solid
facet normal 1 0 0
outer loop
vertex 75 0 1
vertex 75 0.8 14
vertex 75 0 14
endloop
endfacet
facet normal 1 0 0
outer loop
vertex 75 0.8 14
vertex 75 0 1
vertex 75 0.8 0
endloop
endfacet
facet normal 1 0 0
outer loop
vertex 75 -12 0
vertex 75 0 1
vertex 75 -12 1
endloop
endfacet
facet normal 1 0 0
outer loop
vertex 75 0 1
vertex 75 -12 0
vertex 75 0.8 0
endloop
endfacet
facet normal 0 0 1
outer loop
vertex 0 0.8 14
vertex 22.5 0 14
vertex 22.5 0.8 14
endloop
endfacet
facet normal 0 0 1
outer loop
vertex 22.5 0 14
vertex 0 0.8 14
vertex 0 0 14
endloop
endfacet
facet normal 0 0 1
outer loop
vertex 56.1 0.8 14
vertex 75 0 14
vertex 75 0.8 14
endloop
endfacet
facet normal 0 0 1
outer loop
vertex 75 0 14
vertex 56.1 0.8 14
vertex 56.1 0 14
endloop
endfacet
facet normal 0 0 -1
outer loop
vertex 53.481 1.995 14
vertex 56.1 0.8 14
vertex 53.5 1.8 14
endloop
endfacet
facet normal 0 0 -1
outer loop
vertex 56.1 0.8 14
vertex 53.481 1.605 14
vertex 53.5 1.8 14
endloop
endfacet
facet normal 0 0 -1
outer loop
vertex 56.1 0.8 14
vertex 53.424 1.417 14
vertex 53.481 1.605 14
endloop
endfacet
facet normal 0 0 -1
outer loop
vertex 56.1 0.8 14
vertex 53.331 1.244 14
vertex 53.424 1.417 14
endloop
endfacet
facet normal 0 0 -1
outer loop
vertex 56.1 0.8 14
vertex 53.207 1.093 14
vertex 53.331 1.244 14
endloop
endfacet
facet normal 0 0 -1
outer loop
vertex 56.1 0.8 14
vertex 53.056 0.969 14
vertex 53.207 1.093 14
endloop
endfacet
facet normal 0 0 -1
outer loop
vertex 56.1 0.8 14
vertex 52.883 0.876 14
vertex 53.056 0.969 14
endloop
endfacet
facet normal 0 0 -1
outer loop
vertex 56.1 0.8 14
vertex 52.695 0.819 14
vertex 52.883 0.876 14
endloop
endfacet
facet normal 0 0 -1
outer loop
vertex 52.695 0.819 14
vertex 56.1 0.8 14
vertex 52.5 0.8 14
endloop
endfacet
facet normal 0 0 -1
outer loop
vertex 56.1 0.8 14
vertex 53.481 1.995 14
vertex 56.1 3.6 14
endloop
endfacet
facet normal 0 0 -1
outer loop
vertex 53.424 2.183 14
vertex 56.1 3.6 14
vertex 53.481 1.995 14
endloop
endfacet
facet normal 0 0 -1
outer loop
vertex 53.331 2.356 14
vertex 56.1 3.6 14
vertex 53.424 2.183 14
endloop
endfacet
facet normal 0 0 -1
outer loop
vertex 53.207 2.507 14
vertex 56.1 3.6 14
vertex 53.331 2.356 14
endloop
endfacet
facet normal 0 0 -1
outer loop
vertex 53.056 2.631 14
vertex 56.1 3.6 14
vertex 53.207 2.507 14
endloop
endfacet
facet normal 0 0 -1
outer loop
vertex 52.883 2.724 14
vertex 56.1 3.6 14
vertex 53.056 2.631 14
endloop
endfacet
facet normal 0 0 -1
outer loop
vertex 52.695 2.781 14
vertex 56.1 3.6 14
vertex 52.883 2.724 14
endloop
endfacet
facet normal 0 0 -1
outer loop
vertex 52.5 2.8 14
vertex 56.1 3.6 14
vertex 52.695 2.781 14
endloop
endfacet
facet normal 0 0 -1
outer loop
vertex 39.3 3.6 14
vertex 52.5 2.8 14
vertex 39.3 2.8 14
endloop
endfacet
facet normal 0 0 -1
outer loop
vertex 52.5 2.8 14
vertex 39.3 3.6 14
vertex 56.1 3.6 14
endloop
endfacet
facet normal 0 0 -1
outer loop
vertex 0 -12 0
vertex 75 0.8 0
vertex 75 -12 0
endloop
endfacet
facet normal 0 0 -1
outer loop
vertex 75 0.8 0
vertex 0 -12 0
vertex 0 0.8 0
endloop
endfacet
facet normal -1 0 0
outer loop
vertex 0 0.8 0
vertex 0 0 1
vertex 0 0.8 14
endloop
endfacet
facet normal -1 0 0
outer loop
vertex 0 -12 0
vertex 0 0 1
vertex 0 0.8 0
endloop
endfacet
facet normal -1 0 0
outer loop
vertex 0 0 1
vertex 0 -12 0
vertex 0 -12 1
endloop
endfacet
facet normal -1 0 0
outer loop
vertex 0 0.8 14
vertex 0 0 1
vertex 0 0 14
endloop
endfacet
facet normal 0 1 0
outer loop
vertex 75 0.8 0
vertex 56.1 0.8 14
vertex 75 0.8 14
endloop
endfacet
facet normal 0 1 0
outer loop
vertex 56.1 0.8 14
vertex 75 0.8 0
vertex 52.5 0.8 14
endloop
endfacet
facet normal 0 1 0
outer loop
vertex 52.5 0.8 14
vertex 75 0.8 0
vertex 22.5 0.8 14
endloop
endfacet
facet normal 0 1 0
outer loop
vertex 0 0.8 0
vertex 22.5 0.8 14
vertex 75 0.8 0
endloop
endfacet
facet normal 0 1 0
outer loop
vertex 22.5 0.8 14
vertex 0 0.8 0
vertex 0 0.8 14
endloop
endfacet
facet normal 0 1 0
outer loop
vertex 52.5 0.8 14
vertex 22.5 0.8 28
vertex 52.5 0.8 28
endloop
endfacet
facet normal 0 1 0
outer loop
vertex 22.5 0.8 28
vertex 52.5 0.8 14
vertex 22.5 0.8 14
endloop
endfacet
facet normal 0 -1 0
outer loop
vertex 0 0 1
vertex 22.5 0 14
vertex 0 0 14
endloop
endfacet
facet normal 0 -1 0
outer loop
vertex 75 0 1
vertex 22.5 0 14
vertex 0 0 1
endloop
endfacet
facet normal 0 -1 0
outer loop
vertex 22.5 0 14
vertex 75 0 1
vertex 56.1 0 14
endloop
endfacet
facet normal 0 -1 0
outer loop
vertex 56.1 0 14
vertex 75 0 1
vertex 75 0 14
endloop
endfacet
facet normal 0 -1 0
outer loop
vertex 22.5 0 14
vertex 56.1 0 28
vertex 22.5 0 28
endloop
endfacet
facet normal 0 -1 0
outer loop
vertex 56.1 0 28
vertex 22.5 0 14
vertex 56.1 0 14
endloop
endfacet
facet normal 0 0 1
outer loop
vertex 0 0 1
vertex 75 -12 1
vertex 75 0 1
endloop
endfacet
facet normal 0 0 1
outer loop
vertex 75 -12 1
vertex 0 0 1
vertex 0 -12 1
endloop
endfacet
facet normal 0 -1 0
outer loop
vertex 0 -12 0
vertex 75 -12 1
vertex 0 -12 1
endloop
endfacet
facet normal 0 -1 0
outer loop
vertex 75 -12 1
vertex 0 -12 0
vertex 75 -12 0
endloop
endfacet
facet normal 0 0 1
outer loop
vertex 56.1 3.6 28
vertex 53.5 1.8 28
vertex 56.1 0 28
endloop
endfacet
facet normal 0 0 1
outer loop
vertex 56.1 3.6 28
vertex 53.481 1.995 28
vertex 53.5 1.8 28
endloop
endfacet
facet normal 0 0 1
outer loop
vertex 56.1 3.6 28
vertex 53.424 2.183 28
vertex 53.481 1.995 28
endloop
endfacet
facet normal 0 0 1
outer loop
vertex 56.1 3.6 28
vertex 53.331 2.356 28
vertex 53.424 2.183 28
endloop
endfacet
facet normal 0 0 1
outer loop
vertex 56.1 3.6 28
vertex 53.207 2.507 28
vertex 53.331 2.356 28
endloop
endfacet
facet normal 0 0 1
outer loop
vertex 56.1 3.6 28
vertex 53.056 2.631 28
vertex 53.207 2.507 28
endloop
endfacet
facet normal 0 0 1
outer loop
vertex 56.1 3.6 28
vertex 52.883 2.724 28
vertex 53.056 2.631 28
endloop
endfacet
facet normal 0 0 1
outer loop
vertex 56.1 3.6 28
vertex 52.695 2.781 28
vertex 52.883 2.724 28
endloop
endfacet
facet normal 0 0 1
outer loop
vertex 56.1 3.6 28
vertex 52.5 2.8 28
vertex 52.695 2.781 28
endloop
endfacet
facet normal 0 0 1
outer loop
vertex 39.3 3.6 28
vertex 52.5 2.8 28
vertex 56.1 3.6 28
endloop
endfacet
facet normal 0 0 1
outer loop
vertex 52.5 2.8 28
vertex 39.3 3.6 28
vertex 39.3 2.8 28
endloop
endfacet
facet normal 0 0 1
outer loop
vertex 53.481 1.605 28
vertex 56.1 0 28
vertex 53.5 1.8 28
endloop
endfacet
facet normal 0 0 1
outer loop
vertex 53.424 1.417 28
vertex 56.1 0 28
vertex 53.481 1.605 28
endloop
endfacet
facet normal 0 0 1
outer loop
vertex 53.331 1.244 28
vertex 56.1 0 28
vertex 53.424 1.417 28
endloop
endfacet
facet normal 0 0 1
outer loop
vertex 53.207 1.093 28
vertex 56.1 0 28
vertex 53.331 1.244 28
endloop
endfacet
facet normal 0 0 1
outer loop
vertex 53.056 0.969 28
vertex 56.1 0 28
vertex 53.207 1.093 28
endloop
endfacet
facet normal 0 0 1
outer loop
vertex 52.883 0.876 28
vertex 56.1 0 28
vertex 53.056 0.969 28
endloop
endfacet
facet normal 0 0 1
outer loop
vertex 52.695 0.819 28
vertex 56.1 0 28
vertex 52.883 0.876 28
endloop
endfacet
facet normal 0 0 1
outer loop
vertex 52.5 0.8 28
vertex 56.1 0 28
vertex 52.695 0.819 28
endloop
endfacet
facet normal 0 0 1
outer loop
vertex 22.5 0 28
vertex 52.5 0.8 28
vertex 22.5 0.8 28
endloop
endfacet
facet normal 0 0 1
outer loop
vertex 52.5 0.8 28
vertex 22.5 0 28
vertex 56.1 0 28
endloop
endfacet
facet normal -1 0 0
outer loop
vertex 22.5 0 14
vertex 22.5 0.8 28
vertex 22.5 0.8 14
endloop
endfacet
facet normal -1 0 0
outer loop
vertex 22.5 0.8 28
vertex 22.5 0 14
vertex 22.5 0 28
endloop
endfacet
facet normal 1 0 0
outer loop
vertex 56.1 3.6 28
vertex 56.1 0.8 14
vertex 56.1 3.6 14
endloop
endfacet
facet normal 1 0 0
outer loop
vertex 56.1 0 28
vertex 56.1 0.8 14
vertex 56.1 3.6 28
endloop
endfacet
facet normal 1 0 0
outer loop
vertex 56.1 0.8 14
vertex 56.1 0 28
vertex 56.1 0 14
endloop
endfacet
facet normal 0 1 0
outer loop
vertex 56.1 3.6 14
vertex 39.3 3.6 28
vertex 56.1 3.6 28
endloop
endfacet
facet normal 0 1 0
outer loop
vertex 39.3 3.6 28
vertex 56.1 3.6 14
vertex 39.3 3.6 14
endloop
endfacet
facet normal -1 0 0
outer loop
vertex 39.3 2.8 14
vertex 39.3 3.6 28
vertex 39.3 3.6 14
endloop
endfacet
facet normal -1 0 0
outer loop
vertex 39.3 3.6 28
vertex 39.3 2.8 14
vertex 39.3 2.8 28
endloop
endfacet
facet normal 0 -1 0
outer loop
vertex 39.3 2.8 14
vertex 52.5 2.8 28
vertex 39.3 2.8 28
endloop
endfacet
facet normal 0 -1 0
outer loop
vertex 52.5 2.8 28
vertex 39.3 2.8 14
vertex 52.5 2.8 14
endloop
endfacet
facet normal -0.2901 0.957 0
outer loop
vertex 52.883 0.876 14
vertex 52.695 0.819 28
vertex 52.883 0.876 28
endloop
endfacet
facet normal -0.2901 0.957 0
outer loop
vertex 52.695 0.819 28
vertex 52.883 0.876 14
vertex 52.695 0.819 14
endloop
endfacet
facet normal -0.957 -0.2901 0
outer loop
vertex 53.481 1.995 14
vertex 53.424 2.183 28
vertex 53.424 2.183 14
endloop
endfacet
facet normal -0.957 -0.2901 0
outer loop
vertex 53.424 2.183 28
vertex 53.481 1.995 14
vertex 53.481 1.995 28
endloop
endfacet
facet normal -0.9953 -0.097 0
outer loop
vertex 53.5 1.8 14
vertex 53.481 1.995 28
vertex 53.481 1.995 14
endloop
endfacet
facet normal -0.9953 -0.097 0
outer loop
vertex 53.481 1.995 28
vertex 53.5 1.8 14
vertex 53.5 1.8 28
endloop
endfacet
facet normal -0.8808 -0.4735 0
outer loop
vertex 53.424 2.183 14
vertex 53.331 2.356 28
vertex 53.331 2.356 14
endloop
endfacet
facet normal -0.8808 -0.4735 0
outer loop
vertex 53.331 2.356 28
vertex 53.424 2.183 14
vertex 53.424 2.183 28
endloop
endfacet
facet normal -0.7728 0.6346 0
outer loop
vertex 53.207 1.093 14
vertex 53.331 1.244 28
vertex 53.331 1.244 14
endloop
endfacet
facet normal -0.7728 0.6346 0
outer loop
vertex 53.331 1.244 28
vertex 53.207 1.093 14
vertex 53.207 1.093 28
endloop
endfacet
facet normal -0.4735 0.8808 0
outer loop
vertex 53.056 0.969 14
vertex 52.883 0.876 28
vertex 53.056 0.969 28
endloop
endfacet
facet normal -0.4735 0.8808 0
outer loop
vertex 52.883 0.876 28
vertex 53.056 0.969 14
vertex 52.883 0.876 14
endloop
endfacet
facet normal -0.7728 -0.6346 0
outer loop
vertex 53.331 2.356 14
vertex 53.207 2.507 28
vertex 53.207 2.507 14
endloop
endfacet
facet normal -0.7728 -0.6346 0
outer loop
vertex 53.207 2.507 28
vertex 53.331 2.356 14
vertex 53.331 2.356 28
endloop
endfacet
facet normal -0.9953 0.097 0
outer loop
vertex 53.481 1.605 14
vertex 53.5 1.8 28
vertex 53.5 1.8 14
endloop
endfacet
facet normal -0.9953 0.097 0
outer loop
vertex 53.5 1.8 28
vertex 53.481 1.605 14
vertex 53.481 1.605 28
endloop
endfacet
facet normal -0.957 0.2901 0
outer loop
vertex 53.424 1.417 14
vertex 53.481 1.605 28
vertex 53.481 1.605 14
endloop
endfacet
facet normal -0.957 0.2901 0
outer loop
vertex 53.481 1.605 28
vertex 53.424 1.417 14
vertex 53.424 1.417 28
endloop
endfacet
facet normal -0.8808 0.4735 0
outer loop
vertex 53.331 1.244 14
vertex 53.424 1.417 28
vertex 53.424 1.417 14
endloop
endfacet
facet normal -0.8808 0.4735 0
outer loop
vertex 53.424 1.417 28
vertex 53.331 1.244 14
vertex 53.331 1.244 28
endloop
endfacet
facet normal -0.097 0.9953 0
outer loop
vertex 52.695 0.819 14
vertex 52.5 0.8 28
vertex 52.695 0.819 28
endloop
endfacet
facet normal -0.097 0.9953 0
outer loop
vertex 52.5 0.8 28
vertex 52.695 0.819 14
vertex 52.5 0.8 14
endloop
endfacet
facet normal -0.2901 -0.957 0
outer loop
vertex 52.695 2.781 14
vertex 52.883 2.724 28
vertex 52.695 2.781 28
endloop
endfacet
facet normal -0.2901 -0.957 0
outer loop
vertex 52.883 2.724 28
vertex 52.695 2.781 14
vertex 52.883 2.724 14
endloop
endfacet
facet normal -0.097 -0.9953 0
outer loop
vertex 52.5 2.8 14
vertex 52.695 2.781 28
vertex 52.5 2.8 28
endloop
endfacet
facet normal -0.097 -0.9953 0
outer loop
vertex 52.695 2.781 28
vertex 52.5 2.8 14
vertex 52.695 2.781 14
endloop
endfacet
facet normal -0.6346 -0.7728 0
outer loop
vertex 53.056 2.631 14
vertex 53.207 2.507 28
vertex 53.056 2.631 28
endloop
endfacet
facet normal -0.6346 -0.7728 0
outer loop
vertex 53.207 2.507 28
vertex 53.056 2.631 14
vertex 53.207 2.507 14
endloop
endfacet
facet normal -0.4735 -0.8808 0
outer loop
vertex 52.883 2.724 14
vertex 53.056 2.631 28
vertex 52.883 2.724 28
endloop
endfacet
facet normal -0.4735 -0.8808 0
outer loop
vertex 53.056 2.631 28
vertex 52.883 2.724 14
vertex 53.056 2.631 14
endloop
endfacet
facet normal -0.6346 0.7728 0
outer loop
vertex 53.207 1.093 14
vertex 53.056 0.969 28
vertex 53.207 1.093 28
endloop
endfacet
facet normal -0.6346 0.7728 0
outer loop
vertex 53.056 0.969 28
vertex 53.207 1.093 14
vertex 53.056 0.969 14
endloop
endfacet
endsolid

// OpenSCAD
//////////////////////////////////////////////////////////////////////////////////////
///
///  FLEXBATTER: Flexing battery holder with built-in spring
///
///  This file generates battery holders for arbitrary cylindrical sizes.
///  The number of batteries and their size is fully parametrized.
///
///  The usual metallic spring at the minus pole is replaced by a
///  flexible printed spring, which is pressing the contacts firmly to 
///  the battery.
///
///  The contacts for the plus and minus pole can easily be made by
///  a few windings of the uninsulated ends of the connecting wires.
///  Each battery compartment contains are several holes to the outside
///  as well ad to the neighboring compartments, through which connecting
///  wires can be passed for easy configuring of parallel, serial or
///  balanced-serial battery packs.
///  
///  The preconfigured battery sizes are:
///  AA, AAA, C, D, 18650(Li-Ion), 18650P(protected Li-Ion), CR123A(16340)
///  
///  Given that the printed plastic spring needs to be flexible, ABS is the material
///  of choice here.
///
//////////////////////////////////////////////////////////////////////////////////////
///
///  2014-09-09 Heinz Spiess, Switzerland
///
///  released under Creative Commons - Attribution - Share Alike licence (CC BY-SA)
//////////////////////////////////////////////////////////////////////////////////////

// build a cube with chamfered edges
module chamfered_cube(size,d=1){
   hull(){
     translate([d,d,0])cube(size-2*[d,d,0]);
     translate([0,d,d])cube(size-2*[0,d,d]);
     translate([d,0,d])cube(size-2*[d,0,d]);
   }
}


// draw an arc width height h between radius r1..r2 and angles a1..a2
module arc(r1,r2,h,a1=0,a2=0){
     if(a2-a1<=180){
        difference(){
           cylinder(r=r2,h=h);
           translate([0,0,-1])cylinder(r=r1,h=h+2);
	   rotate(a2)translate([-r1-r2,0,-1])cube([2*(r1+r2),2*(r1+r2),h+2]);
	   rotate(a1+180)translate([-r1-r2,0,-1])cube([2*(r1+r2),2*(r1+r2),h+2]);
        }
     } else {
           difference(){
              cylinder(r=r2,h=h);
              translate([0,0,-1])cylinder(r=r1,h=h+2);
              intersection(){
	       rotate(a2)translate([-r1-r2,0,-1])cube([2*(r1+r2),2*(r1+r2),h+2]);
	       rotate(a1+180)translate([-r1-r2,0,-1])cube([2*(r1+r2),2*(r1+r2),h+2]);
	      }
           }
     }
}

/////////////////////////////////////////////////////////////////////////////////
// sline - generate a "snake line" of width w and height h 
// with a arbitrary sequence of segments defined by a radius and a turning angle
//
//   angle[i] > 0  left turn / counter-clockwise
//   angle[i] < 0  left turn / clockwise
//   angle[i] = 0  straight segment with length radius[i]
//
/////////////////////////////////////////////////////////////////////////////////
// Heinz Spiess, 2014-09-06 (CC BY-SA)
/////////////////////////////////////////////////////////////////////////////////
module sline(angle,radius,i,w,h){
   scale([angle[i]>=0?1:-1,1,1])
      assign(r=abs(radius[i]))assign(a=angle[i])
         translate([a?r:0,0,0]){
	    translate([-w/2,-r-0.01,0])cube([w,0.02,h]); // tiny overlap!
            if(a)arc(r-w/2,r+w/2,0,a,h=h);
	    else if(r>0)translate([-w/2,-r,0])cube([w,r,h]);
      if(i+1<len(angle))
           rotate(angle[i])
	      translate([a?-r:0,a?0:-r,0])
	         sline(angle,radius,i+1,w,h);
  }
}

//////////////////////////////////////////////////////////////////////////////////
//
//  FLEXBATTER:  Flexing battery holder with integrated plastic spring
//
//////////////////////////////////////////////////////////////////////////////////
module flexbatter(n=1,l=65,d=18,hf=0.75,r=4,shd=3,eps=0.28,el=0,xchan=[1/4,3/4],$fn=24){
ew=0.56;   // extrusion width
eh=0.25;   // extrusion height
w = 4*ew;  // case wall thickness
ws = 2*ew; // spring wall thickness
ch = w-ws; // edge chamfering
deepen=0; //deepening for side grip of batteries
//el = 0;  // extra length in spring
//eps = 0.28;
//shd = 3; // screw hole diameter
//hf=0.75;
//xchan=[1/4,3/4]; // relative position of traversal wire channels

r = d/5+2*ws; // linear spring length (depends on sline() call!)

   for(i=[0:n-1])translate([0,i*(d+w+ws),0]){ // generate n battery cases
      difference(){
         
         union(){
            difference(){
               // main body
               translate([0,-w-d/2,0])
	          chamfered_cube([l+w,d+2*w+(i<n-1?ws:0),hf*d+w+ch],ch);
	       // main cavity
               translate([-2,-d/2,w])cube([2+l,d,d+1]);
	       // cavity for locating plastic spring
               translate([-1,-d/2,-1])cube([2,d,d+w+2]);
	       // small cylindrical carving of walls and bottom
	       if(eps>0)translate([-1,0,d/2+w])rotate([0,90,0])cylinder(r=d/2+eps,h=l+1);
            }
      
            // plastic spring for minus pole
            for(sy=[-1,1])scale([1,sy,1])assign(D=d+2*w-2*ws-0.7){
               translate([ch,d/2+w-ws/2,0])rotate(-90)
		  //sline([90,0,120,90,120,90,0],[d/8+2,d/6,d/8-1,d/8,-d/8,d/8,d/2],0,ws,hf*d+w);
		  sline([0,180,0,180,0,-180,0,90,0],[r+ch+el,D/4,el,D/12,el/2,D/12,1+el/2,D/5,D/3],0,ws,hf*d+w);


            }
         }
      
         // lower and upper holes for contacts
         for(z=[-2*ws,2*ws])
            translate([-2*ws,-w,w-ws/2+d/2+z])cube([l+2*w+2,2*w,ws]);
      
         // longitudinal bottom wire channel
         translate([-2*ws,0,0])rotate([0,90,0])cylinder(r=w/2,h=l+w+2+r,$fn=5);
      
         // traversal bottom wire channels
         for(x=l*xchan)translate([x,-d/2-w-1,eh]) rotate([-90,0,0])cylinder(r=w/2,h=d+2*w+ws+2,$fn=6);
   
         // grip deepening
	 if(deepen>0)
            translate([w+l/2-0.5,-d/2-w-0.01,w+d+l])
	       rotate([-90,0,0]){
	          cylinder(r=l+deepen*d,h=d+2*w+2*ws+2,$fn=72);
	          if(i==0)cylinder(r1=l+deepen*d+ch,r2=l+deepen*d,h=ch+0.02,$fn=72);
	          if(i==n-1)translate([0,0,d+2*w-ch])cylinder(r2=l+deepen*d+ch,r1=l+deepen*d,h=ch+0.02,$fn=72);

               }
         // conical screw holes in corners
         for(x=[7+shd,l-2*shd])for(y=[-d/2+shd,d/2-shd])
             translate([x,y,-1]){
                cylinder(r=shd/2,h=w+2);
                translate([0,0,w-shd/2+1])cylinder(r1=shd/2,r2=shd,h=shd/2+0.01);
             }

         // holes for wires passing inside
         for(sy=[-1,1])scale([1,sy,1]){
	    translate([l-1,-d/2,w])cube([w+2,2,2]);
            for(x=[3,l-7])translate([x,-d/2-w-ws-1,w])cube([3,w+ws+3,2]); 
            translate([3,-d/2+w/2-0.75,-1])cube([3,1.5,w+2]); 
            translate([-0.5,-d/2+w/2,0])rotate([0,90,0])cylinder(r=w/2,h=6.5,$fn=5);
         }

         // engrave battery symbol
	 translate([w+l/2,d/4+1,w])cube([l/5,d/4.5,4*eh],true);
	 translate([w+l/2+l/10,d/4+1,w])cube([d/7,d/10,4*eh],true);
	 // engrave plus symbol
	 assign(sy=(l>12*shd)?1:-1){ // for short batteries +- on the side
	    translate([w+l/2+l/(sy>0?5:10),sy*(d/4+1),w]){
	       cube([1,d/4,4*eh],true);
	       cube([d/4,1,4*eh],true);
            }
	 // engrave minus symbol
	    translate([w+l/2-l/(sy>0?5:10),sy*(d/4+1),w])
	       cube([1,d/4,4*eh],true);
         }
   
         //correction for middle separators
         //if(i<n-1) translate([-d,d/2+w-ws/2,-1])cube([d,ws/2+0.1,d+2]);
	 //else translate([1,d/2+w,-0.01])cylinder(r1=ch,r2=0,h=ch);
         //if(i>0) translate([-d,-d/2-w-0.1,-1])cube([d,ws/2+0.1,d+2]);
	 //else translate([1,-d/2-w,-0.01])cylinder(r1=ch,r2=0,h=ch);


      }


      // horizontal contact bulges (+ and - pole)
      for(x=[-0.3,l])
         hull()for(y=[-3+el,3-el])
            translate([x,y,w+d/2])sphere(r=ws);
   
      // vertical contact bulge (+ pole only)
      if(0)hull()for(z=[-3+el,3-el])for(x=[0,w-ws])
            translate([l+x,0,w+d/2+z])sphere(r=ws);



   }

}

module flexbatter18650(n=1){
   flexbatter(n=n,l=65.5,d=18.4,hf=0.75,shd=3,eps=0.28);
}  

module flexbatter18650P(n=1){
   flexbatter(n=n,l=67.5,d=18.4,hf=0.75,shd=3,eps=0.28);
}  

module flexbatterCR123A(n=1){
   flexbatter(n=n,l=35.1,d=16.7,hf=0.75,shd=3,xchan=[0.5],eps=0.28);
}  

module flexbatterD(n=1){
   flexbatter(n=n,l=61.5,d=34.0,hf=0.75,shd=3,eps=0.28);
}  

module flexbatterC(n=1){
   flexbatter(n=n,l=51.6,d=26.4,hf=0.75,shd=3,eps=0.28);
}  

module flexbatterAA(n=1){
   flexbatter(n=n,l=51.6,d=14.4,hf=0.80,shd=2.5,el=0.5,eps=0.28);
}  

module flexbatterAAA(n=1){
   flexbatter(n=n,l=46.1,d=10.45,hf=0.84,shd=2,el=1,xchan=[0.5],eps=0);
}  

module flexbatter18650x1(){ // AUTO_MAKE_STL
  flexbatter18650(n=1);
}

module flexbatter18650Px1(){ // AUTO_MAKE_STL
  flexbatter18650P(n=1);
}

module flexbatterCR123Ax1(){ // AUTO_MAKE_STL
  flexbatterCR123A(n=1);
}

module flexbatterAAx1(){ // AUTO_MAKE_STL
  flexbatterAA(n=1);
}

module flexbatterAAAx1(){ // AUTO_MAKE_STL
  flexbatterAAA(n=1);
}

module flexbatterCx1(){ // AUTO_MAKE_STL
  flexbatterC(n=1);
}

module flexbatter18650x2(){ // AUTO_MAKE_STL
  flexbatter18650(n=2);
}

module flexbatterAAx2(){ // AUTO_MAKE_STL
  flexbatterAA(n=2);
}

module flexbatterAAAx2(){ // AUTO_MAKE_STL
  flexbatterAAA(n=2);
}

module flexbatterCx2(){ // AUTO_MAKE_STL
  flexbatterC(n=2);
}

module flexbatter18650x3(){ // AUTO_MAKE_STL
  flexbatter18650(n=3);
}

module flexbatterAAx3(){ // AUTO_MAKE_STL
  flexbatterAA(n=3);
}

module flexbatterAAAx3(){ // AUTO_MAKE_STL
  flexbatterAAA(n=3);
}

module flexbatter18650x4(){ // AUTO_MAKE_STL
  flexbatter18650(n=4);
}

module flexbatterAAx4(){ // AUTO_MAKE_STL
  flexbatterAA(n=4);
}

module flexbatterAAAx4(){ // AUTO_MAKE_STL
  flexbatterAAA(n=4);
}

module rackhook(){
  raillen=75;
  railh=14;
  railth=0.8;
  restde=12;
  pegw=11;
  pegth=1.9;//1.8
  flapw=30;
  flaph=14;
  flapth=railth;
  hookth=flapth;
  hookw=pegw*1.2;
  hookgap=pegth+0.1;
  spineth=flapth+hookgap+hookth;
  difference(){
  union(){
	//rail
  cube([raillen,railth,railh]);
  //rest
  translate([0,-restde,0]) cube([raillen,restde,1]);
  //outer plate
  translate([(raillen/2-flapw/2),0,railh]) cube([flapw,flapth,flaph]);
  //spine of hook 
  translate([(raillen/2+flapw/2),0,railh]) cube([spineth,spineth,flaph]);
  //hook
  translate([(raillen/2-flapw/2)+flapw-hookw,flapth+hookgap,railh]) cube([hookw,flapth,flaph]);
  }//union
 //rounder of spine
  translate([(raillen/2+flapw/2),railth+hookgap/2,railh-0.05]) cylinder(d=hookgap,h=flaph+0.1,$fn=32);
  }//difference
}

rackhook();

// uncomment as needed:

//flexbatterCR123A(n=2);
//rotate([0,0,0])translate([0,0,-9])flexbatter18650(n=1);
//translate([0,40,0])rotate([90,0,0])translate([0,0,-9])flexbatter18650(n=1);
//translate([0,80,0])rotate([180,0,0])translate([0,0,-9])flexbatter18650(n=1);
//translate([0,120,0])rotate([-90,0,0])translate([0,0,-9])flexbatter18650(n=1);
//translate([0,33,0])flexbatter18650(n=2);
//translate([0,90,0])flexbatter18650(n=3);
//translate([-90,33,0])flexbatter18650(n=4);
//translate([0,28,0])flexbatterAA(n=2);
//translate([0,50,0])flexbatterAAA(n=1);
//flexbatterC(n=1);
//flexbatterD(n=1);
